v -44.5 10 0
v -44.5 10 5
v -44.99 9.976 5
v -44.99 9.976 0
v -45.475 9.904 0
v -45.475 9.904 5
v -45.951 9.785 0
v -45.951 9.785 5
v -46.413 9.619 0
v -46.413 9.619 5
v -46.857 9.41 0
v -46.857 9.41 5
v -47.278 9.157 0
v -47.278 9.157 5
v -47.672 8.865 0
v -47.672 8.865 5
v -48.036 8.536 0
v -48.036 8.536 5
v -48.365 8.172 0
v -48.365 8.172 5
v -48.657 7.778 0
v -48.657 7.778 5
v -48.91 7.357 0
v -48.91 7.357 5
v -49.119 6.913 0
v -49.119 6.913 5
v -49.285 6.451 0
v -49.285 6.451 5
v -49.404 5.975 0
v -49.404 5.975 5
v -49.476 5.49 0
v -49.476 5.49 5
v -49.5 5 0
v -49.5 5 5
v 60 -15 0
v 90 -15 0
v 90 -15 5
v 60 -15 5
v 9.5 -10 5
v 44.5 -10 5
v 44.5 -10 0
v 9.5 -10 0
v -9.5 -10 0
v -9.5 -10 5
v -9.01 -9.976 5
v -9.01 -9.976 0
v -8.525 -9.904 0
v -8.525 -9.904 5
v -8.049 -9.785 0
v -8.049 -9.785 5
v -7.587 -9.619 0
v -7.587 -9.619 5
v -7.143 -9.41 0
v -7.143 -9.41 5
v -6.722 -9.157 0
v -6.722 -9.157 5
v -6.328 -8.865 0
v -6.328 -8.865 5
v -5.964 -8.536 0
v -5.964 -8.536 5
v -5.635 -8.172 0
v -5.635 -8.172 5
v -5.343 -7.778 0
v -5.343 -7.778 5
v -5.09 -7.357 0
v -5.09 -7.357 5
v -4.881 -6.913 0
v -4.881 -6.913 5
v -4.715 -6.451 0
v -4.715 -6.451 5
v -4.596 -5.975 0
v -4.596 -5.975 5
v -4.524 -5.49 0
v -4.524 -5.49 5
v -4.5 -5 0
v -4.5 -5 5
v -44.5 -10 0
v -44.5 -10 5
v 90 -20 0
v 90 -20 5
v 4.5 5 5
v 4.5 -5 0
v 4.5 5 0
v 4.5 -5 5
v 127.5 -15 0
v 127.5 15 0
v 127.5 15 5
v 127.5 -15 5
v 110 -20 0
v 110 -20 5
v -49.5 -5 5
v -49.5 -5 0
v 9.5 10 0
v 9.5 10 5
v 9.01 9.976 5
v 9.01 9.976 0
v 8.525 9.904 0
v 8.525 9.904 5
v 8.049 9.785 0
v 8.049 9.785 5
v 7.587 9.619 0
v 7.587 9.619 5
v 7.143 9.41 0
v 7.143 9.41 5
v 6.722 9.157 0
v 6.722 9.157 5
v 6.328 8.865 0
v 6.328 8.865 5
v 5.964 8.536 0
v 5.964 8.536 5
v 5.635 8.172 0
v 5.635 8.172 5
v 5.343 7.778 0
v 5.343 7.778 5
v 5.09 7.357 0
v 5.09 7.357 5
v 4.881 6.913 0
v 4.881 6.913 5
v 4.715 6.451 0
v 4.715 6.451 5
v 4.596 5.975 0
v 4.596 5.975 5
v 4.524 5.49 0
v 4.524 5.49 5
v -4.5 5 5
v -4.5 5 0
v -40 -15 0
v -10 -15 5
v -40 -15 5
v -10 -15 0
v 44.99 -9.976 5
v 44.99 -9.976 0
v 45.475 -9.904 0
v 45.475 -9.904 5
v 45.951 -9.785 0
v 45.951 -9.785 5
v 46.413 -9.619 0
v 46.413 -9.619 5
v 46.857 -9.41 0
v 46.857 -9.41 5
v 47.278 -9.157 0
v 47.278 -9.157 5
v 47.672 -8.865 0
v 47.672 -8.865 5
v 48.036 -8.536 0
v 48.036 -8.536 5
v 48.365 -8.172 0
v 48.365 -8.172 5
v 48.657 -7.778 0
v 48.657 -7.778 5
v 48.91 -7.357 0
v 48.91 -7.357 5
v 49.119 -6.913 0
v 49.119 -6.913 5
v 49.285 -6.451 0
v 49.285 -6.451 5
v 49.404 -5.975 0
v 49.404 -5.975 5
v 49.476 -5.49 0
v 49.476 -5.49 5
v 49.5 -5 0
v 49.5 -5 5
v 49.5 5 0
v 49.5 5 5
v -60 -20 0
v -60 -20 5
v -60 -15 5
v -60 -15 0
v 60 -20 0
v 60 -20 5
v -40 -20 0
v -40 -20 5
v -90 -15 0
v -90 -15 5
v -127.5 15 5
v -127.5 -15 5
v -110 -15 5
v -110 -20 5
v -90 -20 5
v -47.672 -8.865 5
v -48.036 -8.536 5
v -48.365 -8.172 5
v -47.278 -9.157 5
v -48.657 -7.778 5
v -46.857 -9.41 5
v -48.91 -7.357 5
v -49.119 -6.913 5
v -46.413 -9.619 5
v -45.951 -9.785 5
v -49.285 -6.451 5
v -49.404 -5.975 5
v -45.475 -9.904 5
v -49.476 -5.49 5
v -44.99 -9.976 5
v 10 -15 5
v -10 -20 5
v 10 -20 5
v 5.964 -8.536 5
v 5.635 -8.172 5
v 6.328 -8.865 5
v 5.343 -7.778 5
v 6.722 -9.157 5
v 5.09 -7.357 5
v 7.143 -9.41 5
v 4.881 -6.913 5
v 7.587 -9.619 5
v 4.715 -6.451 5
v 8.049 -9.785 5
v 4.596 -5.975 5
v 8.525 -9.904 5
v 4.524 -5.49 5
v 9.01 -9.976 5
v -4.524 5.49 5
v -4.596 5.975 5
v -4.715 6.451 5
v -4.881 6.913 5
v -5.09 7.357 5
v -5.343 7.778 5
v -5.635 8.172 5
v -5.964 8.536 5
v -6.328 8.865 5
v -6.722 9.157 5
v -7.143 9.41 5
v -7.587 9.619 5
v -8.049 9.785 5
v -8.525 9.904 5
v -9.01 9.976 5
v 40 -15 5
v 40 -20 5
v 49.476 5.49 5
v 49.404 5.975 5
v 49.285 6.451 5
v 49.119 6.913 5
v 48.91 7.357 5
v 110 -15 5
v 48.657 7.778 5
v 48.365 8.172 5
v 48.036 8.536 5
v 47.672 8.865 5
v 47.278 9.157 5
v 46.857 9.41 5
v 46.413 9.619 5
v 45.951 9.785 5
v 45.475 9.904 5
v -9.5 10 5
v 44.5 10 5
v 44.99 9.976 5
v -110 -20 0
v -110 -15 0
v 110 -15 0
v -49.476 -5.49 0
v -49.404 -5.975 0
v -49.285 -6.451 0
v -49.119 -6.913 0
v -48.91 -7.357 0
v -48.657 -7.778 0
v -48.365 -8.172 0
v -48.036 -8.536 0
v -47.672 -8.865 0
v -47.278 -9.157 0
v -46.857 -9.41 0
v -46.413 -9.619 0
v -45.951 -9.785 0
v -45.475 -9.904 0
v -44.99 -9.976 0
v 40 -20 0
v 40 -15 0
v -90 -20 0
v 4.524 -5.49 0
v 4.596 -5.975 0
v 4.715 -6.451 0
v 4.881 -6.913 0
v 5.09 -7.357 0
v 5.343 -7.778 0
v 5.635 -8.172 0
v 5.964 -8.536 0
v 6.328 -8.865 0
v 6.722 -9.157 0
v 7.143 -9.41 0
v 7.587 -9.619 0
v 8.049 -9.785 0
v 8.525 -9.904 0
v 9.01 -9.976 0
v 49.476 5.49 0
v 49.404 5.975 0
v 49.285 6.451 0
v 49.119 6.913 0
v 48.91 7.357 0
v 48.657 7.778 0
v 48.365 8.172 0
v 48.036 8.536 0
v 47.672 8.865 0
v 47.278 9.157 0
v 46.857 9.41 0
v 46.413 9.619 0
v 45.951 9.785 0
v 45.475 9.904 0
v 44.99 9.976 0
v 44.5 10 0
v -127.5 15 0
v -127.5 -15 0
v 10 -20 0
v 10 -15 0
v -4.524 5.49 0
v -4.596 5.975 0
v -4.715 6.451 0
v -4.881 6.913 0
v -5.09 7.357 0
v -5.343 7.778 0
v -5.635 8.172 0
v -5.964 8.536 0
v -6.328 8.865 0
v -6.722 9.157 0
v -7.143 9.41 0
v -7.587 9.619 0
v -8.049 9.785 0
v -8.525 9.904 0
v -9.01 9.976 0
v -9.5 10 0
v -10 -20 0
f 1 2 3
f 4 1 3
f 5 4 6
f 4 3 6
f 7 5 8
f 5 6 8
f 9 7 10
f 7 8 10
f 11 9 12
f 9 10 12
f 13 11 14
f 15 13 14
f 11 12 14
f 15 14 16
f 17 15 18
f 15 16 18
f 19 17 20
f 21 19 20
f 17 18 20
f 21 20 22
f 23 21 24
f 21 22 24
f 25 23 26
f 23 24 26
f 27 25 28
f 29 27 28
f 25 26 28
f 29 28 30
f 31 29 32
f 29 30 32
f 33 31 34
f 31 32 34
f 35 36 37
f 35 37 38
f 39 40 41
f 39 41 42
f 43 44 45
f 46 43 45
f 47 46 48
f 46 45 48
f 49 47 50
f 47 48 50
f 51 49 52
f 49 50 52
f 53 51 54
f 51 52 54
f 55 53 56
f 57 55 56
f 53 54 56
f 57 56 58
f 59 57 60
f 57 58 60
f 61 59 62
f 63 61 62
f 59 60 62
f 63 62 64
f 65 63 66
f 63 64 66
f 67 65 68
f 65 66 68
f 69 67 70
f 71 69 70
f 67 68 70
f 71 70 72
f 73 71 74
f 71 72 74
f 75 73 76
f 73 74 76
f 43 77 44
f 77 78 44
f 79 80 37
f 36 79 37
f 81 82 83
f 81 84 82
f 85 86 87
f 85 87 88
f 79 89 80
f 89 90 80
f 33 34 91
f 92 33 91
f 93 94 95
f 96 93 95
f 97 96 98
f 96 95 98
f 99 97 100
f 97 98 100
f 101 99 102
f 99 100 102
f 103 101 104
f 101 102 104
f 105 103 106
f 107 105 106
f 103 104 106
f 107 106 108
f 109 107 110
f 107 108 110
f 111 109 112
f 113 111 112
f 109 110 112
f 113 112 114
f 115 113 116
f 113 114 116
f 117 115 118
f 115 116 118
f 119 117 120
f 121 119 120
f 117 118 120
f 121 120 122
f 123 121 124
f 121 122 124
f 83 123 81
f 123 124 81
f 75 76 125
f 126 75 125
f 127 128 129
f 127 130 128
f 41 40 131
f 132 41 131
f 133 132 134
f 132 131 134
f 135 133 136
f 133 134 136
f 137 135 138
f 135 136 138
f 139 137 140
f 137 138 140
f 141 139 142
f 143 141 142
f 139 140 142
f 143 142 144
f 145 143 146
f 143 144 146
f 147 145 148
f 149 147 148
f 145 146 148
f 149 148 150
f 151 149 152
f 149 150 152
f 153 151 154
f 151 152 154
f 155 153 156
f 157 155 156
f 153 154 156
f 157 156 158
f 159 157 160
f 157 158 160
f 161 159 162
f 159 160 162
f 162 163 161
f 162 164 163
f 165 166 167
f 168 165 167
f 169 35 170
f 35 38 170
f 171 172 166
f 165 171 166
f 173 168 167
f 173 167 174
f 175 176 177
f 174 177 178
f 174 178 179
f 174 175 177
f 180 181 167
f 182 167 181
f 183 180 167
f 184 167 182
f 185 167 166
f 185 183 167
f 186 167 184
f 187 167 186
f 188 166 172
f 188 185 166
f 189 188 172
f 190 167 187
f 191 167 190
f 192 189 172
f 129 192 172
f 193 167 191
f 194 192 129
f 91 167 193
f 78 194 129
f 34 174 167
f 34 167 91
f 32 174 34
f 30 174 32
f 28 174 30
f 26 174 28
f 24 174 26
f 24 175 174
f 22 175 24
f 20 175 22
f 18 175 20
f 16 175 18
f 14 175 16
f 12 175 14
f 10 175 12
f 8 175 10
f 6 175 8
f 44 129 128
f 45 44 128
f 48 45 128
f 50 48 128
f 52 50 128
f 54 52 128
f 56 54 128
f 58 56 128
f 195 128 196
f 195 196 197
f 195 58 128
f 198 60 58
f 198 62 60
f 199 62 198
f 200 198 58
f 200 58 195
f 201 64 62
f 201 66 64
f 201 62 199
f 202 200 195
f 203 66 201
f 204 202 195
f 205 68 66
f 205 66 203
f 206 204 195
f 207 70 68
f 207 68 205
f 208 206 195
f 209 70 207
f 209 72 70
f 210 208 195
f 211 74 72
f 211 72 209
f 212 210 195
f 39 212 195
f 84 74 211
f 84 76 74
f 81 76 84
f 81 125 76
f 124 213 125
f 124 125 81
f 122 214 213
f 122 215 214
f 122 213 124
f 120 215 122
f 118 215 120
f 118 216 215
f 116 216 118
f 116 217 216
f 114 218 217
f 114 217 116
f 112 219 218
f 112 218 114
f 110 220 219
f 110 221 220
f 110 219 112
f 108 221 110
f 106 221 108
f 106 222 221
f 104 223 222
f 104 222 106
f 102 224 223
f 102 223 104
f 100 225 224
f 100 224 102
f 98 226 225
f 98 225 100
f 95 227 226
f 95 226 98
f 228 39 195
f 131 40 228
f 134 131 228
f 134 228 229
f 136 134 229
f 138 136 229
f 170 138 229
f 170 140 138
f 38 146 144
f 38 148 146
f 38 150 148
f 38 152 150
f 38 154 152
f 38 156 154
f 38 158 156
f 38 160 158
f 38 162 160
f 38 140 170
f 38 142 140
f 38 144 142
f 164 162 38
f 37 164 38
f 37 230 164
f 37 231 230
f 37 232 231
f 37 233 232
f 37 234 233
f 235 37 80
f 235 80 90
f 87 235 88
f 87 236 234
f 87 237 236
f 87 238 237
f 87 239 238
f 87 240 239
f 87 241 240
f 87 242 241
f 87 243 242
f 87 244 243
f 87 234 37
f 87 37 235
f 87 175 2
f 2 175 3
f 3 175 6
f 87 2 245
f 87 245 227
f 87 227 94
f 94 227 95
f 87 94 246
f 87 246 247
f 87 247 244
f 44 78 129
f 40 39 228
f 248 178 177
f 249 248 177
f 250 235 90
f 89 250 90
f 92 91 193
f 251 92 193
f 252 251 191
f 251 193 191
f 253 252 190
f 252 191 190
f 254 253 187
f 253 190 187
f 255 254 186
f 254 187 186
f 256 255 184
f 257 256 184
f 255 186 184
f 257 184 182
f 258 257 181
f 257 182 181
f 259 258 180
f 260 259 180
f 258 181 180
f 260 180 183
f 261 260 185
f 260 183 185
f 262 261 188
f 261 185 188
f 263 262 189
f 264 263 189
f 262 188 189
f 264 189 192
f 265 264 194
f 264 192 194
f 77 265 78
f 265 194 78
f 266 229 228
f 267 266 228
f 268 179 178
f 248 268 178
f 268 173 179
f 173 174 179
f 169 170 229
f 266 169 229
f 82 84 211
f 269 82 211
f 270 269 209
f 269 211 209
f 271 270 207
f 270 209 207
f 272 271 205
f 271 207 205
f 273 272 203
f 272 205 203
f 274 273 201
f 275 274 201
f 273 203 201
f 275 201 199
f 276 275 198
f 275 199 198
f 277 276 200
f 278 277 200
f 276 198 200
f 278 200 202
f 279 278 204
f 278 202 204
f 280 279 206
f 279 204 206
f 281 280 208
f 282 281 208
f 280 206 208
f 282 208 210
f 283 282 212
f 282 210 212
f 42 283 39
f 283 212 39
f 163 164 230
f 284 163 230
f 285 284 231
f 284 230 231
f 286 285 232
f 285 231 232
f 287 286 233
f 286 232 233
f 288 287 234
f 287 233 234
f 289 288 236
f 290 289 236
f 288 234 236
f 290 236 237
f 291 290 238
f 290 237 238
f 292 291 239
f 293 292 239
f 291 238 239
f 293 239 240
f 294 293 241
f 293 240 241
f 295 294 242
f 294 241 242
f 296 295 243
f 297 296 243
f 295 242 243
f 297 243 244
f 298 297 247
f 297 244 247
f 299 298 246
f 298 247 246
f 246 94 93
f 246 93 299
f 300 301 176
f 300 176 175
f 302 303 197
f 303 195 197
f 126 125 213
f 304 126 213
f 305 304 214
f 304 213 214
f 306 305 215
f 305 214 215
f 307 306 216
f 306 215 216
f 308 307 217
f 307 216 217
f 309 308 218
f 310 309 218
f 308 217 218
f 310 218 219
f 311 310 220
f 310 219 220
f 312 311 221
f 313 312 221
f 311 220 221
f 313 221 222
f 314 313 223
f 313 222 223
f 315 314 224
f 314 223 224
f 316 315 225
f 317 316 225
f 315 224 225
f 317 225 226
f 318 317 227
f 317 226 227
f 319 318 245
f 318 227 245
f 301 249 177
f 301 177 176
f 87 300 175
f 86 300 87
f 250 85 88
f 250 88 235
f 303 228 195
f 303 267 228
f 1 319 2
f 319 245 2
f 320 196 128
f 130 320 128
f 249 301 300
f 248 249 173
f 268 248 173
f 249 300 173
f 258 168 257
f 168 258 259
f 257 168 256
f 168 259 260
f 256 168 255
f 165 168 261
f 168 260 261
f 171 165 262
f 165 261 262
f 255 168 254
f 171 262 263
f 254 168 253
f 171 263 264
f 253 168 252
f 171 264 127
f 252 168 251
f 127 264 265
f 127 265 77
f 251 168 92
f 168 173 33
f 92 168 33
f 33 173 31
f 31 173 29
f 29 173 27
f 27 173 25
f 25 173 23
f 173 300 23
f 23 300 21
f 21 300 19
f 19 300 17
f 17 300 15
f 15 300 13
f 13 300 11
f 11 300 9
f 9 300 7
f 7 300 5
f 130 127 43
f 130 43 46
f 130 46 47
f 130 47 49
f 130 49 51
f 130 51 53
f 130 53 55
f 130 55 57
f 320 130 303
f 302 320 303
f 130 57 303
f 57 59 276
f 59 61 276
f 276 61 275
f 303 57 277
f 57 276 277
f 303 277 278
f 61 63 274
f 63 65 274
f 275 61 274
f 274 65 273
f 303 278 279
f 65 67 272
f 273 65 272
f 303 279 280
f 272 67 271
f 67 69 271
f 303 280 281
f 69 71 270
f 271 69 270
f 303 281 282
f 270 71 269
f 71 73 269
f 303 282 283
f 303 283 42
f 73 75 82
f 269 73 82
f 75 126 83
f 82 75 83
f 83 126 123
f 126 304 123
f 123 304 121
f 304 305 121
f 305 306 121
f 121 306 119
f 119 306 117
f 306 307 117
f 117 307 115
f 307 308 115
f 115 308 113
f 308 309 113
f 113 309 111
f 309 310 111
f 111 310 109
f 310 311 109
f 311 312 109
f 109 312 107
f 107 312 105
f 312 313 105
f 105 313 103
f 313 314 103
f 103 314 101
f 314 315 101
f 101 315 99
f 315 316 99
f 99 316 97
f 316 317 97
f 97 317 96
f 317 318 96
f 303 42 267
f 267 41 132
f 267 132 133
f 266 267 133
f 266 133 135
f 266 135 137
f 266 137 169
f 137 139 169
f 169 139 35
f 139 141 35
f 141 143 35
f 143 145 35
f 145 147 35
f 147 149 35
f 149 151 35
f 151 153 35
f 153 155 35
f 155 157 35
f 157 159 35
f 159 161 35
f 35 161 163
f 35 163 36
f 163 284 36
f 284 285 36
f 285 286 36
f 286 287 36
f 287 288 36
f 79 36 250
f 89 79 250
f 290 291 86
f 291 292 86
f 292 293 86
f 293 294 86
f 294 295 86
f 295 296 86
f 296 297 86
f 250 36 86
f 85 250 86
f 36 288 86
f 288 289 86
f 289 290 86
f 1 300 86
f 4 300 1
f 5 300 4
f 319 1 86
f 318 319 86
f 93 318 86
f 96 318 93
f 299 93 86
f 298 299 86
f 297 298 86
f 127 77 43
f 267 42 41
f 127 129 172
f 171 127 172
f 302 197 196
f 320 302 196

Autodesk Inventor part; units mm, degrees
ref_plane "YZ Plane" through (0, 0, 0) normal (1, 0, 0) x (0, 1, 0)
ref_plane "XZ Plane" through (0, 0, 0) normal (0, 1, 0) x (-1, 0, 0)
ref_plane "XY Plane" through (0, 0, 0) normal (0, 0, 1) x (1, 0, 0)
sketch "Sketch1" plane through (0, 0, 0) normal (0, 0, 1) x (1, 0, 0)
  line L0 (-127.5, 15) -> (127.5, 15)
  line L1 (127.5, 15) -> (127.5, -15)
  line L2 (127.5, -15) -> (-127.5, -15)
  line L3 (-127.5, -15) -> (-127.5, 15)
  line L4 (-127.5, 15) -> (127.5, -15) construction
  line L5 (127.5, 15) -> (-127.5, -15) construction
  point P0 (0, 0)
  dimension "d0" = 255
  dimension "d1" = 30
extrude "Extrusion1" add sketch "Sketch1" along normal blind 5
sketch "Sketch2" plane through (0, 0, 5) normal (0, 0, 1) x (1, 0, 0)
  line L0 (-127.5, -15) -> (127.5, -15) projected
  line L1 (-110, -15) -> (-90, -15)
  line L2 (-90, -15) -> (-90, -20)
  line L3 (-90, -20) -> (-110, -20)
  line L4 (-110, -20) -> (-110, -15)
  line L5 (-60, -15) -> (-40, -15)
  line L6 (-40, -15) -> (-40, -20)
  line L7 (-40, -20) -> (-60, -20)
  line L8 (-60, -20) -> (-60, -15)
  line L9 (-10, -15) -> (10, -15)
  line L10 (10, -15) -> (10, -20)
  line L11 (10, -20) -> (-10, -20)
  line L12 (-10, -20) -> (-10, -15)
  line L13 (40, -15) -> (60, -15)
  line L14 (60, -15) -> (60, -20)
  line L15 (60, -20) -> (40, -20)
  line L16 (40, -20) -> (40, -15)
  line L17 (90, -15) -> (110, -15)
  line L18 (110, -15) -> (110, -20)
  line L19 (110, -20) -> (90, -20)
  line L20 (90, -20) -> (90, -15)
  point P0 (0, 0)
  point P1 (60, -15)
  point P2 (40, -15)
  point P3 (-90, -15)
  point P4 (-40, -15)
  point P5 (-60, -15)
  point P6 (10, -15)
  point P7 (-10, -15)
  point P8 (110, -15)
  point P9 (90, -15)
  dimension "d4" = 20
  dimension "d5" = 5
  dimension "d6" = 17.5
  dimension "d9" = 50
  dimension "d14" = 17.5
extrude "Extrusion2" add sketch "Sketch2" against normal blind 5
sketch "Sketch3" plane through (0, 0, 5) normal (0, 0, 1) x (1, 0, 0)
  line L0 (9.5, 10) -> (44.5, 10)
  line L1 (49.5, 5) -> (49.5, -5)
  line L2 (44.5, -10) -> (9.5, -10)
  line L3 (4.5, -5) -> (4.5, 5)
  line L4 (4.5, 10) -> (49.5, -10) construction
  line L5 (49.5, 10) -> (4.5, -10) construction
  line L6 (0, -10) -> (0, 0)
  line L7 (-9.5, 10) -> (-44.5, 10)
  line L8 (-49.5, 5) -> (-49.5, -5)
  line L9 (-44.5, -10) -> (-9.5, -10)
  line L10 (-4.5, -5) -> (-4.5, 5)
  line L11 (-4.5, 10) -> (-49.5, -10) construction
  line L12 (-49.5, 10) -> (-4.5, -10) construction
  arc A0 (49.5, 5) -> (44.5, 10) centre (44.5, 5) ccw
  arc A1 (44.5, -10) -> (49.5, -5) centre (44.5, -5) ccw
  arc A2 (4.5, -5) -> (9.5, -10) centre (9.5, -5) ccw
  arc A3 (9.5, 10) -> (4.5, 5) centre (9.5, 5) ccw
  arc A4 (-4.5, 5) -> (-9.5, 10) centre (-9.5, 5) ccw
  arc A5 (-9.5, -10) -> (-4.5, -5) centre (-9.5, -5) ccw
  arc A6 (-44.5, 10) -> (-49.5, 5) centre (-44.5, 5) ccw
  arc A7 (-49.5, -5) -> (-44.5, -10) centre (-44.5, -5) ccw
  point P0 (27, 0)
  point P1 (-27, 0)
  dimension "d17" = 45
  dimension "d18" = 20
  dimension "d19" = 27
  dimension "d22" = 5
extrude "Extrusion3" cut sketch "Sketch3" against normal blind 10
properties part number "Divisória-25cm Frontal"
